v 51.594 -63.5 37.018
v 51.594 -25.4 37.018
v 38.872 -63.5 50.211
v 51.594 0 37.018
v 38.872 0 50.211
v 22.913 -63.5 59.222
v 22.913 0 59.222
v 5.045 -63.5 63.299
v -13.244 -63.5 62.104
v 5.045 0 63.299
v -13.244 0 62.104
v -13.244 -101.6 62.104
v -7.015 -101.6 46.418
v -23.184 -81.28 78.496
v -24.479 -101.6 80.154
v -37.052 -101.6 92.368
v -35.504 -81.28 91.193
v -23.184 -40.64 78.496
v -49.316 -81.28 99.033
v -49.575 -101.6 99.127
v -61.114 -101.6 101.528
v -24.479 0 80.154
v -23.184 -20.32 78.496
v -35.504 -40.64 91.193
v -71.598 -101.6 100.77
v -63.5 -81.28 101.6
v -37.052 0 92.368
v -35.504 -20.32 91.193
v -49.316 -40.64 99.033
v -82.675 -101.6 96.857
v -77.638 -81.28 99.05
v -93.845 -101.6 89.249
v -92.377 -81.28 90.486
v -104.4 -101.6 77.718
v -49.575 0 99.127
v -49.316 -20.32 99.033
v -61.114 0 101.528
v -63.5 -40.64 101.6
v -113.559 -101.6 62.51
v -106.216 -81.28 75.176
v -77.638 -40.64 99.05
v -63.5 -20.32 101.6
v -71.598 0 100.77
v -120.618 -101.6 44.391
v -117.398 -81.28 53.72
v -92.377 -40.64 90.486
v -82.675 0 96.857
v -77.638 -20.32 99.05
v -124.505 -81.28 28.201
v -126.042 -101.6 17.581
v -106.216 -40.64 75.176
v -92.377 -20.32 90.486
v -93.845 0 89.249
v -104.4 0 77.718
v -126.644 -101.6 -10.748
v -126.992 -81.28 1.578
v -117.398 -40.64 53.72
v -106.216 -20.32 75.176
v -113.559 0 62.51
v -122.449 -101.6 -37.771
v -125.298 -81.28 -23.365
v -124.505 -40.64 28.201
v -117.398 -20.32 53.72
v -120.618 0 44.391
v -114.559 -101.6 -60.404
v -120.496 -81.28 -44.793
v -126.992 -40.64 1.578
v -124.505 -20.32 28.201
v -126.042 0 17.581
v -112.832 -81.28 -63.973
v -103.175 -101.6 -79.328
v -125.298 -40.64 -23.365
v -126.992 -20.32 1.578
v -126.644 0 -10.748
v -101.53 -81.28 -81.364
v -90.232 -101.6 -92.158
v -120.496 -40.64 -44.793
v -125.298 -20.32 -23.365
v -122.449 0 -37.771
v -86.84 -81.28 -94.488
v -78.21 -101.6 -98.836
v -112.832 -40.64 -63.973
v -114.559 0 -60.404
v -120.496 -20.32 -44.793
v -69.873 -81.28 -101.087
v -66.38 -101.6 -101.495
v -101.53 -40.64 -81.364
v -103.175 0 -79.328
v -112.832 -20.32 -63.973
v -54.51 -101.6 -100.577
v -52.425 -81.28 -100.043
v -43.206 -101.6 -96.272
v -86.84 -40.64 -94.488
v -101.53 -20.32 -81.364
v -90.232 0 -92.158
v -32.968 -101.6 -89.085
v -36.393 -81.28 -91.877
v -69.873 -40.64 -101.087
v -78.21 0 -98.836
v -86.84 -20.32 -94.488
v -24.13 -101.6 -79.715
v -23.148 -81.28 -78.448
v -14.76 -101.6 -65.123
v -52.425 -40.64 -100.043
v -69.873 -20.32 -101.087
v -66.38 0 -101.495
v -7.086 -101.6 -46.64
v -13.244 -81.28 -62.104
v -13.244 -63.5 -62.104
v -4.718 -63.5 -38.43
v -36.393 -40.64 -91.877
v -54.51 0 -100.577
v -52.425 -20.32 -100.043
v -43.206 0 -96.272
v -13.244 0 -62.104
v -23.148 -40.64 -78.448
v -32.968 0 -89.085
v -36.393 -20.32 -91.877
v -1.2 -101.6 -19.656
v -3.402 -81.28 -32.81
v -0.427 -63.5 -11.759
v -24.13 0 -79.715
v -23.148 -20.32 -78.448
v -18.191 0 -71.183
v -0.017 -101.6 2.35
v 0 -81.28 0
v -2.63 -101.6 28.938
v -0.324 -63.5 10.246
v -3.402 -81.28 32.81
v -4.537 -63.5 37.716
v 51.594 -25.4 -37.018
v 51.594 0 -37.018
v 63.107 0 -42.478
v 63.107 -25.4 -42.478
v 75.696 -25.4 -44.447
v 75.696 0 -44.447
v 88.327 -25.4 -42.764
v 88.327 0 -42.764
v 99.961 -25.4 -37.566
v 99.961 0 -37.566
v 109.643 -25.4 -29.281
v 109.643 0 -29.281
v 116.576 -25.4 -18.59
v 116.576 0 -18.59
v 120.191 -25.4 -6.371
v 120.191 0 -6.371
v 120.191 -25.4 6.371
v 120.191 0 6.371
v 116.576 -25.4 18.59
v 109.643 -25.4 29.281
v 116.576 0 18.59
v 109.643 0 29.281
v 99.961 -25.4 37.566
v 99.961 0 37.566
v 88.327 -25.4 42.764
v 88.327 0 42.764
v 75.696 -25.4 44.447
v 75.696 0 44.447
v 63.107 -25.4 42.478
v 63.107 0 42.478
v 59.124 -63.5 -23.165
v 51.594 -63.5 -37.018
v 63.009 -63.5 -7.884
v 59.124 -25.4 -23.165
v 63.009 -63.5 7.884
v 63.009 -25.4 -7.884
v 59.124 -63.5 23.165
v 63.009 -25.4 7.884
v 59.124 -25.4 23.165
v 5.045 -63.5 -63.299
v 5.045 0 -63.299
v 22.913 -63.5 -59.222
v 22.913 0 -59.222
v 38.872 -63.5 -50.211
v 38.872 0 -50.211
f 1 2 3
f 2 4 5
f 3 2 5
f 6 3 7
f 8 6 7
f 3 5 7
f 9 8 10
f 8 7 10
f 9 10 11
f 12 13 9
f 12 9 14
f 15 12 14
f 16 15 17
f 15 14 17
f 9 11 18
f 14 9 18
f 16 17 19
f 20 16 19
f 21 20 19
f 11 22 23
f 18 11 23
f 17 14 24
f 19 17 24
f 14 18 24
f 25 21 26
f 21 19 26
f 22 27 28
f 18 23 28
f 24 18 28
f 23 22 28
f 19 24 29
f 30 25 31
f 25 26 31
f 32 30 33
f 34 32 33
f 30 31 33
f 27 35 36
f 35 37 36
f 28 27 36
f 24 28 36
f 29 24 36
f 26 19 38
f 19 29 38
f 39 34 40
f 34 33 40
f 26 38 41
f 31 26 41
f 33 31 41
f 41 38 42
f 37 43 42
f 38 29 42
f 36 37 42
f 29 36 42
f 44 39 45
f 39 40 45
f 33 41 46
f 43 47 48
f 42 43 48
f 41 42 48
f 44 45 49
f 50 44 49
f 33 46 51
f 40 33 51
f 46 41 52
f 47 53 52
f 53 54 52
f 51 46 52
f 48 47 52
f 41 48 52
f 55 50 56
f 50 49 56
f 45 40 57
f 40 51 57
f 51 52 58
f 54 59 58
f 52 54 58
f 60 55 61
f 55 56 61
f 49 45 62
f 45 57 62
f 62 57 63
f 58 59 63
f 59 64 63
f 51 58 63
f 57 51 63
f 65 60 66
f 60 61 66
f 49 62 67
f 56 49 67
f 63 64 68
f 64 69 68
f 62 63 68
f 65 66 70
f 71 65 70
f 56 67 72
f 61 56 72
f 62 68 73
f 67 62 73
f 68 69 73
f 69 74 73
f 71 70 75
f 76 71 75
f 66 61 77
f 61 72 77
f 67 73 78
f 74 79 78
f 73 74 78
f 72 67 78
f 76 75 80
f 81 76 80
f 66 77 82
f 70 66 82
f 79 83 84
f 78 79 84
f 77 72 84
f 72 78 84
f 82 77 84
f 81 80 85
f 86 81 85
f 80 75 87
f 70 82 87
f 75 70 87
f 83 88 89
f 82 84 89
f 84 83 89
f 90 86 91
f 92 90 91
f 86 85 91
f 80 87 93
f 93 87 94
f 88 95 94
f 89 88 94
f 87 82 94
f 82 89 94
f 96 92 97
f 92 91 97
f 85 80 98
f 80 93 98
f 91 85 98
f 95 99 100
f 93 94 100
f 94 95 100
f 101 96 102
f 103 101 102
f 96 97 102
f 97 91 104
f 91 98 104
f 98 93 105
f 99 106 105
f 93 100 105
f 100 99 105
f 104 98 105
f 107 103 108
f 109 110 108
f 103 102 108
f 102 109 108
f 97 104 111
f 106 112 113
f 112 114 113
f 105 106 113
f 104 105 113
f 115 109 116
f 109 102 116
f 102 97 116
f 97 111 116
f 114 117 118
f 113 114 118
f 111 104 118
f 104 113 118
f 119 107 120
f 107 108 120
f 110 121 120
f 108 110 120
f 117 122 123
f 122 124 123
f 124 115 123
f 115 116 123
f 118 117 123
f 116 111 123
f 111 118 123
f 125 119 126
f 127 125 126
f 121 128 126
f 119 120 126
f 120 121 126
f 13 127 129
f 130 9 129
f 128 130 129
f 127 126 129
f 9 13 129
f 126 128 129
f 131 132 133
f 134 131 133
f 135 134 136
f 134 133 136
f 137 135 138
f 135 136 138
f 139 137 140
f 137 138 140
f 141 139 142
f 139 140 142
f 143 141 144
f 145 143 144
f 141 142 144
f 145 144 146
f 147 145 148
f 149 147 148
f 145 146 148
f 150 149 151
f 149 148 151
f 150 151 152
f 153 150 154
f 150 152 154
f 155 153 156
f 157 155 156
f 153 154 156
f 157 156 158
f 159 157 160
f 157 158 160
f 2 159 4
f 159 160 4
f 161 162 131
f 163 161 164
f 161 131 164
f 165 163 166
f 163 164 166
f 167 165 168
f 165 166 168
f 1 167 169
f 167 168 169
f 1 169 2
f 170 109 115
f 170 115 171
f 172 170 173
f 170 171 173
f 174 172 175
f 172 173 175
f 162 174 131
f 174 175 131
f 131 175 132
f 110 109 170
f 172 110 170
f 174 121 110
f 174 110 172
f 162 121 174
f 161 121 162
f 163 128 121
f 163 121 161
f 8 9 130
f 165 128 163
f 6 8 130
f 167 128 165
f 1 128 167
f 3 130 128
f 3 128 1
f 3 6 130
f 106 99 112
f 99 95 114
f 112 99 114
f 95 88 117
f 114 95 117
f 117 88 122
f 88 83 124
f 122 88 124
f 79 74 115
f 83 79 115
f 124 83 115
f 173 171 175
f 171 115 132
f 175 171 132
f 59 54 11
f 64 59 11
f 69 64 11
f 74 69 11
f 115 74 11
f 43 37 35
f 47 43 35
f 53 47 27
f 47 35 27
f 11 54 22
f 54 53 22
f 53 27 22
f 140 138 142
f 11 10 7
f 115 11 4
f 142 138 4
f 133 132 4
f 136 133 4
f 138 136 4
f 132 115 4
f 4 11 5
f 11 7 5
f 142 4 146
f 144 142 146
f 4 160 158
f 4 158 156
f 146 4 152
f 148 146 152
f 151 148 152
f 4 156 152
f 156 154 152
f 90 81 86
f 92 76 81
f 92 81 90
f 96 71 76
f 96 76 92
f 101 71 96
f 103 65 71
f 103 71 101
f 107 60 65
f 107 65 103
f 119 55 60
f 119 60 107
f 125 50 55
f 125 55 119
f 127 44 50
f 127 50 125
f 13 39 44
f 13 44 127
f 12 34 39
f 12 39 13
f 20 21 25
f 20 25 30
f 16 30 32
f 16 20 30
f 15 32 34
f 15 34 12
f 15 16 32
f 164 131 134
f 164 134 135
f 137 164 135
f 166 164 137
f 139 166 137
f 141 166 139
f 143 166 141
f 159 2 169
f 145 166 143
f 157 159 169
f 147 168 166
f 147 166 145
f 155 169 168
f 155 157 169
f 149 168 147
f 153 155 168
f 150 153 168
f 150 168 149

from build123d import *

# Parameters (mm, degrees)
F1_DEPTH = 25.4
F2_DEPTH = 63.5
F3_DEPTH = 101.6


with BuildPart() as f1:
    # F0 (on Front) → F1 (new body)
    with BuildSketch(Plane.XZ):
        with BuildLine():
            ThreePointArc((51.59375, 37.0180356169), (60.4501990278, 19.4428248333), (63.5, 0))
            ThreePointArc((63.5, 0), (60.4501990278, -19.4428248333), (51.59375, -37.0180356169))
            ThreePointArc((51.59375, -37.0180356169), (97.2006510316, -39.1762065066), (120.65, 0))
            ThreePointArc((120.65, 0), (97.2006510316, 39.1762065066), (51.59375, 37.0180356169))
        make_face()
    extrude(amount=F1_DEPTH)

    # F0 (on Front) → F2 (join)
    with BuildSketch(Plane.XZ):
        with BuildLine():
            Line((31.75, 0), (0, 0))
            add(Edge.make_bspline(
                [(-13.2439655959, -62.1035214404), (0, -34.6669399309), (0, 0)],
                knots=[4.0547434617, 4.0547434617, 4.0547434617, 4.7123889804, 4.7123889804, 4.7123889804], degree=2, weights=[1, 0.9464231645, 1]))
            ThreePointArc((-13.2439655959, -62.1035214404), (22.9128106244, -59.2220660674), (51.59375, -37.0180356169))
            ThreePointArc((51.59375, -37.0180356169), (37.0237934934, -21.0006510316), (31.75, 0))
        make_face()
        with BuildLine():
            Line((63.5, 0), (31.75, 0))
            ThreePointArc((31.75, 0), (37.0237934934, -21.0006510316), (51.59375, -37.0180356169))
            ThreePointArc((51.59375, -37.0180356169), (60.4501990278, -19.4428248333), (63.5, 0))
        make_face()
        with BuildLine():
            add(Edge.make_bspline(
                [(0, 0), (0, 34.6669399309), (-13.2439655959, 62.1035214404)],
                knots=[4.7123889804, 4.7123889804, 4.7123889804, 5.370034499, 5.370034499, 5.370034499], degree=2, weights=[1, 0.9464231645, 1]))
            Line((0, 0), (31.75, 0))
            ThreePointArc((31.75, 0), (37.0237934934, 21.0006510316), (51.59375, 37.0180356169))
            ThreePointArc((51.59375, 37.0180356169), (22.9128106244, 59.2220660674), (-13.2439655959, 62.1035214404))
        make_face()
        with BuildLine():
            ThreePointArc((51.59375, 37.0180356169), (37.0237934934, 21.0006510316), (31.75, 0))
            Line((31.75, 0), (63.5, 0))
            ThreePointArc((63.5, 0), (60.4501990278, 19.4428248333), (51.59375, 37.0180356169))
        make_face()
    extrude(amount=F2_DEPTH)

    # F0 (on Front) → F3 (join)
    with BuildSketch(Plane.XZ):
        with BuildLine():
            add(Edge.make_bspline(
                [(-63.5, 101.6), (-165.437374262, 101.6), (-120.4955415237, -44.7930922222), (-75.5537087854, -191.1861844445), (-13.2439655959, -62.1035214404)],
                knots=[0, 0, 0, 2.0273717309, 2.0273717309, 4.0547434617, 4.0547434617, 4.0547434617], degree=2, weights=[1, 0.5287358074, 1, 0.5287358074, 1]))
            ThreePointArc((-13.2439655959, -62.1035214404), (-49.3621404284, -39.9453262889), (-63.5, 0))
            Line((-63.5, 0), (-63.5, 101.6))
        make_face()
        with BuildLine():
            add(Edge.make_bspline(
                [(-13.2439655959, -62.1035214404), (0, -34.6669399309), (0, 0)],
                knots=[4.0547434617, 4.0547434617, 4.0547434617, 4.7123889804, 4.7123889804, 4.7123889804], degree=2, weights=[1, 0.9464231645, 1]))
            add(Edge.make_bspline(
                [(0, 0), (0, 34.6669399309), (-13.2439655959, 62.1035214404)],
                knots=[4.7123889804, 4.7123889804, 4.7123889804, 5.370034499, 5.370034499, 5.370034499], degree=2, weights=[1, 0.9464231645, 1]))
            ThreePointArc((-13.2439655959, 62.1035214404), (-49.3621404284, 39.9453262889), (-63.5, 0))
            ThreePointArc((-63.5, 0), (-49.3621404284, -39.9453262889), (-13.2439655959, -62.1035214404))
        make_face()
        with BuildLine():
            ThreePointArc((-63.5, 0), (-49.3621404284, 39.9453262889), (-13.2439655959, 62.1035214404))
            add(Edge.make_bspline(
                [(-13.2439655959, 62.1035214404), (-32.3093875408, 101.6), (-63.5, 101.6)],
                knots=[5.370034499, 5.370034499, 5.370034499, 6.2831853072, 6.2831853072, 6.2831853072], degree=2, weights=[1, 0.8975675831, 1]))
            Line((-63.5, 101.6), (-63.5, 0))
        make_face()
    extrude(amount=F3_DEPTH)


solid = f1.part
